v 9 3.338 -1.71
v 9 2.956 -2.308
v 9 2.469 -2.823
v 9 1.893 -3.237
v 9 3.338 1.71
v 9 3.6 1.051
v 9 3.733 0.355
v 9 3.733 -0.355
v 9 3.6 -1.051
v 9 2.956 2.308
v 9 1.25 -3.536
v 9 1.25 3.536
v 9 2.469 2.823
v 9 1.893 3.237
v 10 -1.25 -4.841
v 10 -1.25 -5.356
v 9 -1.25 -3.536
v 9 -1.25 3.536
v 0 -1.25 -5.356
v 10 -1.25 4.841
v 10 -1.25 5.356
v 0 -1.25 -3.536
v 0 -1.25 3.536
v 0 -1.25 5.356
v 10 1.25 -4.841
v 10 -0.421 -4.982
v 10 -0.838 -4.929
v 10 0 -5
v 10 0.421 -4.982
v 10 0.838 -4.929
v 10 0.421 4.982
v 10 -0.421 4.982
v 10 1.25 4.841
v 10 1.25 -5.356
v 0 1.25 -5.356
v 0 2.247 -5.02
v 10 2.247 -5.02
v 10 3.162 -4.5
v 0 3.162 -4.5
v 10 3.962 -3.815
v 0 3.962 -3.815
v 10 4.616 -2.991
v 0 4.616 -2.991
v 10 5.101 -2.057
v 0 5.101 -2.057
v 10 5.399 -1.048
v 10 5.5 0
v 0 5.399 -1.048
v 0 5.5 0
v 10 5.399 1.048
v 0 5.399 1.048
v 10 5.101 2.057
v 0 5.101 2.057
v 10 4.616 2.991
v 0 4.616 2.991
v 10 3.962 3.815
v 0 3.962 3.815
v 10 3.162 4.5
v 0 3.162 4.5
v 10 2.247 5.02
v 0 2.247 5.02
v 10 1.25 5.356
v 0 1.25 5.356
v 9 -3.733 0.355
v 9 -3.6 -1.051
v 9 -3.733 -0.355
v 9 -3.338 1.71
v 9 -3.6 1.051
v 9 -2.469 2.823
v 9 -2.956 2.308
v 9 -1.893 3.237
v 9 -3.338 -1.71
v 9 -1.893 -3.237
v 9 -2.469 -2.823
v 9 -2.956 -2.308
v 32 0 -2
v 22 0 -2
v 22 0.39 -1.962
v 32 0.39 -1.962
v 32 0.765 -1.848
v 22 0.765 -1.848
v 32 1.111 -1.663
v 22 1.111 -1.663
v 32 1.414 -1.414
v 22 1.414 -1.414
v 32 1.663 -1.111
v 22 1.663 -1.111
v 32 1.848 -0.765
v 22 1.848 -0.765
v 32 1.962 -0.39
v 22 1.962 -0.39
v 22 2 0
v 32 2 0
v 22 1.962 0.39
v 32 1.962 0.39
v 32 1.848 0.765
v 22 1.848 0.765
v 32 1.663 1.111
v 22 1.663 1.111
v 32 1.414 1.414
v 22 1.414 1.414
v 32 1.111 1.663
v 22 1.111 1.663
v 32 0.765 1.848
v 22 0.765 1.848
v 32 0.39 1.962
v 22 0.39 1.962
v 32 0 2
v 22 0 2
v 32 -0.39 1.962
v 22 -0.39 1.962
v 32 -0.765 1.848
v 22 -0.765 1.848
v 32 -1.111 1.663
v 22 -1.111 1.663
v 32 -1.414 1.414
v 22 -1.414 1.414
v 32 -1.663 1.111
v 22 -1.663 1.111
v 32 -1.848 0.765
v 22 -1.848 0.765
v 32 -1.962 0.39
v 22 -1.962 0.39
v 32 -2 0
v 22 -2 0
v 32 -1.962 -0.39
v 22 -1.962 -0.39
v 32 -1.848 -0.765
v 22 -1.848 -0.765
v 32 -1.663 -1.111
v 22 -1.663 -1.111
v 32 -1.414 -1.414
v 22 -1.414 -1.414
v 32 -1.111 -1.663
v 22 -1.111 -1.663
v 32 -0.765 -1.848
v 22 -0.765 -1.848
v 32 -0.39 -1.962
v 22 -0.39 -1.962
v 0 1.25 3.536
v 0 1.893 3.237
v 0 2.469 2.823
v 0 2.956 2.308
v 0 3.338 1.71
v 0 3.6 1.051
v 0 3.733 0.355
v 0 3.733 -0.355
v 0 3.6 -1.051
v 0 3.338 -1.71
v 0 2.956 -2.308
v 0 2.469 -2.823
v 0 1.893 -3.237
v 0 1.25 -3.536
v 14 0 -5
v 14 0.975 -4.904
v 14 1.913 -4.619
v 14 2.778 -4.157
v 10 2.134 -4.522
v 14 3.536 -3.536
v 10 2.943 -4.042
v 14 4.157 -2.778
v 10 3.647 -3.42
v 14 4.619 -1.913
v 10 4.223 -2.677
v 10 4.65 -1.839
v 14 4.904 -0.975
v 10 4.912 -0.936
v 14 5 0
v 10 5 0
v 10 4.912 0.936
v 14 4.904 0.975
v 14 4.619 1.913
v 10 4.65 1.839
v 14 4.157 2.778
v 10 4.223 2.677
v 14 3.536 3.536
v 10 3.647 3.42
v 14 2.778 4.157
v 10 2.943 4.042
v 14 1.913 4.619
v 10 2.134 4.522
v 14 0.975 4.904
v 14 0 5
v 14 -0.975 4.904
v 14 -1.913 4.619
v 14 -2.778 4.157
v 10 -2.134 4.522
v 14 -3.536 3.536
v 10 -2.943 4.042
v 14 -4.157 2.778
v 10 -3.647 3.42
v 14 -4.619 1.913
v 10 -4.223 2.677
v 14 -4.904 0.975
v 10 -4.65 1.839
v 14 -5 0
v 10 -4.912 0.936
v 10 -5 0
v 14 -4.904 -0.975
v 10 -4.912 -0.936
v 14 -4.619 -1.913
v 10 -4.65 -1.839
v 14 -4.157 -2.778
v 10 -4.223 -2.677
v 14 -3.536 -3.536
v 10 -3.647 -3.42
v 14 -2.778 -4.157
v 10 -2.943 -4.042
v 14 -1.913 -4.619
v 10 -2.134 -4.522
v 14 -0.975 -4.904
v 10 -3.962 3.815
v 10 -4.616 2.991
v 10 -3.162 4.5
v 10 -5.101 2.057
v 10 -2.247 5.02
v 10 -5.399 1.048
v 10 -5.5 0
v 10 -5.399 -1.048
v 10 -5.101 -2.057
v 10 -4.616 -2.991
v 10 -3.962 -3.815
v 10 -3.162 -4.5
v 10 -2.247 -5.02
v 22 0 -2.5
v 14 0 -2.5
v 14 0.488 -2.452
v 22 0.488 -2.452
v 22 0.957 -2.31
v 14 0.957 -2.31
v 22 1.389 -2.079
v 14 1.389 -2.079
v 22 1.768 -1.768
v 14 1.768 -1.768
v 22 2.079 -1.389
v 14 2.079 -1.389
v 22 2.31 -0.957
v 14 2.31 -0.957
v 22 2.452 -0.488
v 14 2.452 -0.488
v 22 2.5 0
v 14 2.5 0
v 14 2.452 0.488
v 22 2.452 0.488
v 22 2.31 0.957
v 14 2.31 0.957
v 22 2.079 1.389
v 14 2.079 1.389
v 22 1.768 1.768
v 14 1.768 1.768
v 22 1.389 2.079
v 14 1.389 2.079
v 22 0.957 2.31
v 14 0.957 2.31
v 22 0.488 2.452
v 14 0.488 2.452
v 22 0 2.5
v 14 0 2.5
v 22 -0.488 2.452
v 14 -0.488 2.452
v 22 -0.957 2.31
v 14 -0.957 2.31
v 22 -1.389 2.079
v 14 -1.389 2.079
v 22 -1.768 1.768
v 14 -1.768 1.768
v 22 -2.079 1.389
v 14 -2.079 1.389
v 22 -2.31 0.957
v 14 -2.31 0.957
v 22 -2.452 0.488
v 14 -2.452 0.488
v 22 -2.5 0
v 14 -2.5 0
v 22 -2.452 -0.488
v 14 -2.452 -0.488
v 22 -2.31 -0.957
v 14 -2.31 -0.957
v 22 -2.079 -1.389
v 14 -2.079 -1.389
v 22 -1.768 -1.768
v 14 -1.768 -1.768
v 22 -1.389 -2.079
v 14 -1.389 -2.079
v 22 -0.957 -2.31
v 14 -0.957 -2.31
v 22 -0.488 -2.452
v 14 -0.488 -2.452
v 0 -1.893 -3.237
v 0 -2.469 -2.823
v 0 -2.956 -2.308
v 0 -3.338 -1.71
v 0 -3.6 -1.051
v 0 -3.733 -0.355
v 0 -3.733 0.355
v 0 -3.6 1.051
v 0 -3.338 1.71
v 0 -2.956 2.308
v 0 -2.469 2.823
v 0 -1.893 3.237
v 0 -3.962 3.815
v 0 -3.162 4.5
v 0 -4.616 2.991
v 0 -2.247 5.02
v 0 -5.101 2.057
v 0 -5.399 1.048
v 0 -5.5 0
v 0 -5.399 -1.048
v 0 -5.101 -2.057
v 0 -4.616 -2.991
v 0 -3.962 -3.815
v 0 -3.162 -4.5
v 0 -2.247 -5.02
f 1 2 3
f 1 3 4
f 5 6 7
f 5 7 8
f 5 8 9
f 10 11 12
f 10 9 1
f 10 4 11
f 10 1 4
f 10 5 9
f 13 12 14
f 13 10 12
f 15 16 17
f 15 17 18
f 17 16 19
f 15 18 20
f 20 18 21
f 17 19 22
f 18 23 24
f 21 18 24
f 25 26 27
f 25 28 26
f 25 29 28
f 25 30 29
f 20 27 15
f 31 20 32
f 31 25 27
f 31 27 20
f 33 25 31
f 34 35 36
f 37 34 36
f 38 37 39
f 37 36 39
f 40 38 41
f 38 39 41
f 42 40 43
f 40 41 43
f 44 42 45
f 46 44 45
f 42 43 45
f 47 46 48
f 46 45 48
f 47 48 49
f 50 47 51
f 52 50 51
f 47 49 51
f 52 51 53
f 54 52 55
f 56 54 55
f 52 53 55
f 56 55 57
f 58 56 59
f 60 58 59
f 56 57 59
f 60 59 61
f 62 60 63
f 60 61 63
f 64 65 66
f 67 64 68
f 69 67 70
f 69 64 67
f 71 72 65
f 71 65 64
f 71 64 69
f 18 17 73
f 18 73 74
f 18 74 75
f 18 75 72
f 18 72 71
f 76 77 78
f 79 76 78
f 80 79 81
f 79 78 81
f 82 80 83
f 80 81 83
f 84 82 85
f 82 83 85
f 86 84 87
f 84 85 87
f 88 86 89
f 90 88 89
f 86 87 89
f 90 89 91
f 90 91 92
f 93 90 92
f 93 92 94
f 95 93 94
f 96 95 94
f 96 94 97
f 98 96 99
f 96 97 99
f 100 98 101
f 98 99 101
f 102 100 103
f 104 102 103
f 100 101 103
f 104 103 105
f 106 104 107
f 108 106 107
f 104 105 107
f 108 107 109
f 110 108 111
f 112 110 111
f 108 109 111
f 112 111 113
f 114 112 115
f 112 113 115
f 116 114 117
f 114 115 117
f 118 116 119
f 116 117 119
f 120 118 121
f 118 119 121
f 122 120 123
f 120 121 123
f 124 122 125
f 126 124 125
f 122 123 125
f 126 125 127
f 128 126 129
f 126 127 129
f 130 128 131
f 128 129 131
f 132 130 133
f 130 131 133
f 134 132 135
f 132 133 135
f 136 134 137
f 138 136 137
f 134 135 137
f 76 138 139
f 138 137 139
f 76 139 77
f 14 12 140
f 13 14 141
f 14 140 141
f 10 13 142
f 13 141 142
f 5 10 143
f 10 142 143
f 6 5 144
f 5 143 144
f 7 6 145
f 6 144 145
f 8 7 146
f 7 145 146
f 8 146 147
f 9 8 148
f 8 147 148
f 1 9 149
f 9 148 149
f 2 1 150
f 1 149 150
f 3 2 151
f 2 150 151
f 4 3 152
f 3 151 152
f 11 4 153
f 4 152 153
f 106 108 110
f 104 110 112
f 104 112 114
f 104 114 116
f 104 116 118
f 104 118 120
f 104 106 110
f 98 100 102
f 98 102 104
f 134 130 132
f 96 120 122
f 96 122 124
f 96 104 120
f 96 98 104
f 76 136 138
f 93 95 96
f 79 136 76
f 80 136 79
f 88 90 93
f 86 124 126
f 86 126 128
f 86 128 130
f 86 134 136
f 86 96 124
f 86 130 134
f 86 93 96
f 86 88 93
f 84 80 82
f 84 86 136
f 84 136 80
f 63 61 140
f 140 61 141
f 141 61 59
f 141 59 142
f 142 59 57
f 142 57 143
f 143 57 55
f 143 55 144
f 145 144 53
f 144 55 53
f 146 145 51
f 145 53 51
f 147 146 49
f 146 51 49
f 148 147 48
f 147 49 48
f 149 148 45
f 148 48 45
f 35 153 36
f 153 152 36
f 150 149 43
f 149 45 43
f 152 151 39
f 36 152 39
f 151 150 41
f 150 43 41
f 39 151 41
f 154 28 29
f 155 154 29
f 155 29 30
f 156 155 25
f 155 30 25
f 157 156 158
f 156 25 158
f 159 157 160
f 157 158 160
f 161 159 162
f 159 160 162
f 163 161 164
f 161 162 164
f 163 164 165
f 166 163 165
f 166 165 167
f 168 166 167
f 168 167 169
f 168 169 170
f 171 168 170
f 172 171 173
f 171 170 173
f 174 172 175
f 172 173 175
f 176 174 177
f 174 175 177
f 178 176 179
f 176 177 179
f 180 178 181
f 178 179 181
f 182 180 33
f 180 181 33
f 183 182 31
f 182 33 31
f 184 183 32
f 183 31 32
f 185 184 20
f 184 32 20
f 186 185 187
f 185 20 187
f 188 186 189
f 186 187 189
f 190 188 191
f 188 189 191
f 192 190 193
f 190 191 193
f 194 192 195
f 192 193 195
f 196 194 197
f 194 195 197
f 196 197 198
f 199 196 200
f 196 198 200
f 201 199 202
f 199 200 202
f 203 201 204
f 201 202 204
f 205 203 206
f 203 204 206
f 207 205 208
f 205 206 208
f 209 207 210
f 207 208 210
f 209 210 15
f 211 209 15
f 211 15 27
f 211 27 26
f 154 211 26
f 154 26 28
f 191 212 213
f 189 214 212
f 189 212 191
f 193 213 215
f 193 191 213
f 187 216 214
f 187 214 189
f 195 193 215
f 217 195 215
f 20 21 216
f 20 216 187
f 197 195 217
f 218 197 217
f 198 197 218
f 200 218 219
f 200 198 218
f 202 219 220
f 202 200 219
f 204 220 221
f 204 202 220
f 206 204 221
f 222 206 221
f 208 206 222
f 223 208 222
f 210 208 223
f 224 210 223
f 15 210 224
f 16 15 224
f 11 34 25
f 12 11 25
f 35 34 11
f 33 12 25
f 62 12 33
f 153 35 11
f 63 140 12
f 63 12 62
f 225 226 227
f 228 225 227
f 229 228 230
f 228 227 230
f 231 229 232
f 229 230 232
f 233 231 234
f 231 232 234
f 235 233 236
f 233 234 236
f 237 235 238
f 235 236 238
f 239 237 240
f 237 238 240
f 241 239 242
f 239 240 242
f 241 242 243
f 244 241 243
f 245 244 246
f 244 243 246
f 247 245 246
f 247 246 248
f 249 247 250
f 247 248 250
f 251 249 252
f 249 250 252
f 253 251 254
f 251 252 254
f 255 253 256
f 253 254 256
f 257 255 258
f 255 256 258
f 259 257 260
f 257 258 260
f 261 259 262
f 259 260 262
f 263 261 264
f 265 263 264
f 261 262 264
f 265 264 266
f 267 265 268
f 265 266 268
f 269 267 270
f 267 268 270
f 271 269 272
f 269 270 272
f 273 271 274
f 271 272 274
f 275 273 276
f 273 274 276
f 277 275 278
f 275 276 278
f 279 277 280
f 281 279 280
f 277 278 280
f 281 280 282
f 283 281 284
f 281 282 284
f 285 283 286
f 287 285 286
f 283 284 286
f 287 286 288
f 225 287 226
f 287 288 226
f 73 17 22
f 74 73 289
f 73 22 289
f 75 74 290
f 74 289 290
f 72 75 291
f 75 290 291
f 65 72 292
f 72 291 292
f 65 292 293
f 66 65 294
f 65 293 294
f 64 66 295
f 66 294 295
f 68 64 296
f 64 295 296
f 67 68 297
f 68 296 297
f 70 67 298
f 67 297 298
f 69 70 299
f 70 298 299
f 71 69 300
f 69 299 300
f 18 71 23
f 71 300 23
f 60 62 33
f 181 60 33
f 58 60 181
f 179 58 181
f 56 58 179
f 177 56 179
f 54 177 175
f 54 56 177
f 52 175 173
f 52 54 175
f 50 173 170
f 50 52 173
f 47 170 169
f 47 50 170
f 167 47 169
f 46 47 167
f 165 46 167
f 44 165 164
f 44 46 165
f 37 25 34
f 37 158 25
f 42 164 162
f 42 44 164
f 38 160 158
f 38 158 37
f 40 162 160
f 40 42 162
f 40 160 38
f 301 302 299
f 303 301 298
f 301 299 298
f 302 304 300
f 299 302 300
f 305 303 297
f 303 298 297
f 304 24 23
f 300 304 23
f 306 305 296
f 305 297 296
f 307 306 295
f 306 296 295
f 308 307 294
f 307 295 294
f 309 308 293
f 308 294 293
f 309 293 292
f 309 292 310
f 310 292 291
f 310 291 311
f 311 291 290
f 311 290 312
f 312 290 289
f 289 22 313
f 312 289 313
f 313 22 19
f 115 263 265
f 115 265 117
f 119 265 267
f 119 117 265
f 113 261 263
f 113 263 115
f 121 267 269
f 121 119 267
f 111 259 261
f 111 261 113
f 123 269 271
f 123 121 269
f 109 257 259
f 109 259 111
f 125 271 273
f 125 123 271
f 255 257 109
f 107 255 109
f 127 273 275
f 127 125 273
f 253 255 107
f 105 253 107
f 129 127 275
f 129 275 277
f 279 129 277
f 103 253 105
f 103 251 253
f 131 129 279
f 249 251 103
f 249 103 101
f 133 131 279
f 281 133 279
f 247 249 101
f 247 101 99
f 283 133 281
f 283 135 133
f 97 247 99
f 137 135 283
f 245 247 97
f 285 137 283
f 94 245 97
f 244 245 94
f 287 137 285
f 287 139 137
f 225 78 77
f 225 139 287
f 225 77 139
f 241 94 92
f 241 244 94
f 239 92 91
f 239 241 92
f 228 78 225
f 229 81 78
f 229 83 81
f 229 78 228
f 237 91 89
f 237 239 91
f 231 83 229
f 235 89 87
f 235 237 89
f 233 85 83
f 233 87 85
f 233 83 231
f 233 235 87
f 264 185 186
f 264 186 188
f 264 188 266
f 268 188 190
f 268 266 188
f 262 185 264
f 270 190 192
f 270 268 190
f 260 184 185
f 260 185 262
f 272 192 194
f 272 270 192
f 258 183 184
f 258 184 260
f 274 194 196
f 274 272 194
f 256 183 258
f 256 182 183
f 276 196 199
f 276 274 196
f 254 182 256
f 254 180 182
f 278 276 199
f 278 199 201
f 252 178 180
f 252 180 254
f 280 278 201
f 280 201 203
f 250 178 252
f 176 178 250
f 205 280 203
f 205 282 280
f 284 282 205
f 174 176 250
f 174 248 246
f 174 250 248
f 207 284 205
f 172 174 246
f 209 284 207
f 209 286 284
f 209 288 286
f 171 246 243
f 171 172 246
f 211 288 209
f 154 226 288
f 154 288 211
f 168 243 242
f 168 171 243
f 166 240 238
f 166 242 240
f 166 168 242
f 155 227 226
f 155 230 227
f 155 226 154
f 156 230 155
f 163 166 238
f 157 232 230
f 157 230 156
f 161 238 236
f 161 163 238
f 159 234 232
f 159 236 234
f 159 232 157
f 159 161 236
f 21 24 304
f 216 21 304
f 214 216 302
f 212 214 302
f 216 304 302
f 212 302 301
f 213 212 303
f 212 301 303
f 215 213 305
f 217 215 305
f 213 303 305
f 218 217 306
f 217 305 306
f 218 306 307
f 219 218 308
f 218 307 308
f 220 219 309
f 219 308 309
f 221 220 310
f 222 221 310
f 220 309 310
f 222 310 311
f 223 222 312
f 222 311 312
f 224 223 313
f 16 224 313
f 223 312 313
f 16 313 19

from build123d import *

# Parameters (mm, degrees)
SKETCH1_R           = 5.5
BOSS_EXTRUDE1_DEPTH = 10
SKETCH2_R           = 5
BOSS_EXTRUDE2_DEPTH = 4
SKETCH3_R           = 2.5
BOSS_EXTRUDE3_DEPTH = 8
SKETCH4_R           = 2
BOSS_EXTRUDE4_DEPTH = 10
SKETCH5_R           = 3.75
CUT_EXTRUDE1_DEPTH  = 9
SKETCH6_W           = 25.507413715
SKETCH6_H           = 2.5
CUT_EXTRUDE2_DEPTH  = 10


with BuildPart() as part:
    # Sketch1 → Boss-Extrude1 (new body)
    with BuildSketch(Plane(origin=(0, 0, 0), x_dir=(0, 0, -1), z_dir=(1, 0, 0))):
        Circle(SKETCH1_R)
    extrude(amount=BOSS_EXTRUDE1_DEPTH)

    # Sketch2 → Boss-Extrude2 (add)
    with BuildSketch(Plane(origin=(10, 0, 0), x_dir=(0, 0, -1), z_dir=(1, 0, 0))):
        Circle(SKETCH2_R)
    extrude(amount=BOSS_EXTRUDE2_DEPTH)

    # Sketch3 → Boss-Extrude3 (add)
    with BuildSketch(Plane(origin=(14, 0, 0), x_dir=(0, 0, -1), z_dir=(1, 0, 0))):
        Circle(SKETCH3_R)
    extrude(amount=BOSS_EXTRUDE3_DEPTH)

    # Sketch4 → Boss-Extrude4 (add)
    with BuildSketch(Plane(origin=(22, 0, 0), x_dir=(0, 0, -1), z_dir=(1, 0, 0))):
        Circle(SKETCH4_R)
    extrude(amount=BOSS_EXTRUDE4_DEPTH)

    # Sketch5 → Cut-Extrude1 (cut)
    with BuildSketch(Plane.ZY):
        Circle(SKETCH5_R)
    extrude(amount=-CUT_EXTRUDE1_DEPTH, mode=Mode.SUBTRACT)

    # Sketch6 → Cut-Extrude2 (cut)
    with BuildSketch(Plane.ZY):
        with Locations((1.683379731, 0)):
            Rectangle(SKETCH6_W, SKETCH6_H)
    extrude(amount=-CUT_EXTRUDE2_DEPTH, mode=Mode.SUBTRACT)


solid = part.part
